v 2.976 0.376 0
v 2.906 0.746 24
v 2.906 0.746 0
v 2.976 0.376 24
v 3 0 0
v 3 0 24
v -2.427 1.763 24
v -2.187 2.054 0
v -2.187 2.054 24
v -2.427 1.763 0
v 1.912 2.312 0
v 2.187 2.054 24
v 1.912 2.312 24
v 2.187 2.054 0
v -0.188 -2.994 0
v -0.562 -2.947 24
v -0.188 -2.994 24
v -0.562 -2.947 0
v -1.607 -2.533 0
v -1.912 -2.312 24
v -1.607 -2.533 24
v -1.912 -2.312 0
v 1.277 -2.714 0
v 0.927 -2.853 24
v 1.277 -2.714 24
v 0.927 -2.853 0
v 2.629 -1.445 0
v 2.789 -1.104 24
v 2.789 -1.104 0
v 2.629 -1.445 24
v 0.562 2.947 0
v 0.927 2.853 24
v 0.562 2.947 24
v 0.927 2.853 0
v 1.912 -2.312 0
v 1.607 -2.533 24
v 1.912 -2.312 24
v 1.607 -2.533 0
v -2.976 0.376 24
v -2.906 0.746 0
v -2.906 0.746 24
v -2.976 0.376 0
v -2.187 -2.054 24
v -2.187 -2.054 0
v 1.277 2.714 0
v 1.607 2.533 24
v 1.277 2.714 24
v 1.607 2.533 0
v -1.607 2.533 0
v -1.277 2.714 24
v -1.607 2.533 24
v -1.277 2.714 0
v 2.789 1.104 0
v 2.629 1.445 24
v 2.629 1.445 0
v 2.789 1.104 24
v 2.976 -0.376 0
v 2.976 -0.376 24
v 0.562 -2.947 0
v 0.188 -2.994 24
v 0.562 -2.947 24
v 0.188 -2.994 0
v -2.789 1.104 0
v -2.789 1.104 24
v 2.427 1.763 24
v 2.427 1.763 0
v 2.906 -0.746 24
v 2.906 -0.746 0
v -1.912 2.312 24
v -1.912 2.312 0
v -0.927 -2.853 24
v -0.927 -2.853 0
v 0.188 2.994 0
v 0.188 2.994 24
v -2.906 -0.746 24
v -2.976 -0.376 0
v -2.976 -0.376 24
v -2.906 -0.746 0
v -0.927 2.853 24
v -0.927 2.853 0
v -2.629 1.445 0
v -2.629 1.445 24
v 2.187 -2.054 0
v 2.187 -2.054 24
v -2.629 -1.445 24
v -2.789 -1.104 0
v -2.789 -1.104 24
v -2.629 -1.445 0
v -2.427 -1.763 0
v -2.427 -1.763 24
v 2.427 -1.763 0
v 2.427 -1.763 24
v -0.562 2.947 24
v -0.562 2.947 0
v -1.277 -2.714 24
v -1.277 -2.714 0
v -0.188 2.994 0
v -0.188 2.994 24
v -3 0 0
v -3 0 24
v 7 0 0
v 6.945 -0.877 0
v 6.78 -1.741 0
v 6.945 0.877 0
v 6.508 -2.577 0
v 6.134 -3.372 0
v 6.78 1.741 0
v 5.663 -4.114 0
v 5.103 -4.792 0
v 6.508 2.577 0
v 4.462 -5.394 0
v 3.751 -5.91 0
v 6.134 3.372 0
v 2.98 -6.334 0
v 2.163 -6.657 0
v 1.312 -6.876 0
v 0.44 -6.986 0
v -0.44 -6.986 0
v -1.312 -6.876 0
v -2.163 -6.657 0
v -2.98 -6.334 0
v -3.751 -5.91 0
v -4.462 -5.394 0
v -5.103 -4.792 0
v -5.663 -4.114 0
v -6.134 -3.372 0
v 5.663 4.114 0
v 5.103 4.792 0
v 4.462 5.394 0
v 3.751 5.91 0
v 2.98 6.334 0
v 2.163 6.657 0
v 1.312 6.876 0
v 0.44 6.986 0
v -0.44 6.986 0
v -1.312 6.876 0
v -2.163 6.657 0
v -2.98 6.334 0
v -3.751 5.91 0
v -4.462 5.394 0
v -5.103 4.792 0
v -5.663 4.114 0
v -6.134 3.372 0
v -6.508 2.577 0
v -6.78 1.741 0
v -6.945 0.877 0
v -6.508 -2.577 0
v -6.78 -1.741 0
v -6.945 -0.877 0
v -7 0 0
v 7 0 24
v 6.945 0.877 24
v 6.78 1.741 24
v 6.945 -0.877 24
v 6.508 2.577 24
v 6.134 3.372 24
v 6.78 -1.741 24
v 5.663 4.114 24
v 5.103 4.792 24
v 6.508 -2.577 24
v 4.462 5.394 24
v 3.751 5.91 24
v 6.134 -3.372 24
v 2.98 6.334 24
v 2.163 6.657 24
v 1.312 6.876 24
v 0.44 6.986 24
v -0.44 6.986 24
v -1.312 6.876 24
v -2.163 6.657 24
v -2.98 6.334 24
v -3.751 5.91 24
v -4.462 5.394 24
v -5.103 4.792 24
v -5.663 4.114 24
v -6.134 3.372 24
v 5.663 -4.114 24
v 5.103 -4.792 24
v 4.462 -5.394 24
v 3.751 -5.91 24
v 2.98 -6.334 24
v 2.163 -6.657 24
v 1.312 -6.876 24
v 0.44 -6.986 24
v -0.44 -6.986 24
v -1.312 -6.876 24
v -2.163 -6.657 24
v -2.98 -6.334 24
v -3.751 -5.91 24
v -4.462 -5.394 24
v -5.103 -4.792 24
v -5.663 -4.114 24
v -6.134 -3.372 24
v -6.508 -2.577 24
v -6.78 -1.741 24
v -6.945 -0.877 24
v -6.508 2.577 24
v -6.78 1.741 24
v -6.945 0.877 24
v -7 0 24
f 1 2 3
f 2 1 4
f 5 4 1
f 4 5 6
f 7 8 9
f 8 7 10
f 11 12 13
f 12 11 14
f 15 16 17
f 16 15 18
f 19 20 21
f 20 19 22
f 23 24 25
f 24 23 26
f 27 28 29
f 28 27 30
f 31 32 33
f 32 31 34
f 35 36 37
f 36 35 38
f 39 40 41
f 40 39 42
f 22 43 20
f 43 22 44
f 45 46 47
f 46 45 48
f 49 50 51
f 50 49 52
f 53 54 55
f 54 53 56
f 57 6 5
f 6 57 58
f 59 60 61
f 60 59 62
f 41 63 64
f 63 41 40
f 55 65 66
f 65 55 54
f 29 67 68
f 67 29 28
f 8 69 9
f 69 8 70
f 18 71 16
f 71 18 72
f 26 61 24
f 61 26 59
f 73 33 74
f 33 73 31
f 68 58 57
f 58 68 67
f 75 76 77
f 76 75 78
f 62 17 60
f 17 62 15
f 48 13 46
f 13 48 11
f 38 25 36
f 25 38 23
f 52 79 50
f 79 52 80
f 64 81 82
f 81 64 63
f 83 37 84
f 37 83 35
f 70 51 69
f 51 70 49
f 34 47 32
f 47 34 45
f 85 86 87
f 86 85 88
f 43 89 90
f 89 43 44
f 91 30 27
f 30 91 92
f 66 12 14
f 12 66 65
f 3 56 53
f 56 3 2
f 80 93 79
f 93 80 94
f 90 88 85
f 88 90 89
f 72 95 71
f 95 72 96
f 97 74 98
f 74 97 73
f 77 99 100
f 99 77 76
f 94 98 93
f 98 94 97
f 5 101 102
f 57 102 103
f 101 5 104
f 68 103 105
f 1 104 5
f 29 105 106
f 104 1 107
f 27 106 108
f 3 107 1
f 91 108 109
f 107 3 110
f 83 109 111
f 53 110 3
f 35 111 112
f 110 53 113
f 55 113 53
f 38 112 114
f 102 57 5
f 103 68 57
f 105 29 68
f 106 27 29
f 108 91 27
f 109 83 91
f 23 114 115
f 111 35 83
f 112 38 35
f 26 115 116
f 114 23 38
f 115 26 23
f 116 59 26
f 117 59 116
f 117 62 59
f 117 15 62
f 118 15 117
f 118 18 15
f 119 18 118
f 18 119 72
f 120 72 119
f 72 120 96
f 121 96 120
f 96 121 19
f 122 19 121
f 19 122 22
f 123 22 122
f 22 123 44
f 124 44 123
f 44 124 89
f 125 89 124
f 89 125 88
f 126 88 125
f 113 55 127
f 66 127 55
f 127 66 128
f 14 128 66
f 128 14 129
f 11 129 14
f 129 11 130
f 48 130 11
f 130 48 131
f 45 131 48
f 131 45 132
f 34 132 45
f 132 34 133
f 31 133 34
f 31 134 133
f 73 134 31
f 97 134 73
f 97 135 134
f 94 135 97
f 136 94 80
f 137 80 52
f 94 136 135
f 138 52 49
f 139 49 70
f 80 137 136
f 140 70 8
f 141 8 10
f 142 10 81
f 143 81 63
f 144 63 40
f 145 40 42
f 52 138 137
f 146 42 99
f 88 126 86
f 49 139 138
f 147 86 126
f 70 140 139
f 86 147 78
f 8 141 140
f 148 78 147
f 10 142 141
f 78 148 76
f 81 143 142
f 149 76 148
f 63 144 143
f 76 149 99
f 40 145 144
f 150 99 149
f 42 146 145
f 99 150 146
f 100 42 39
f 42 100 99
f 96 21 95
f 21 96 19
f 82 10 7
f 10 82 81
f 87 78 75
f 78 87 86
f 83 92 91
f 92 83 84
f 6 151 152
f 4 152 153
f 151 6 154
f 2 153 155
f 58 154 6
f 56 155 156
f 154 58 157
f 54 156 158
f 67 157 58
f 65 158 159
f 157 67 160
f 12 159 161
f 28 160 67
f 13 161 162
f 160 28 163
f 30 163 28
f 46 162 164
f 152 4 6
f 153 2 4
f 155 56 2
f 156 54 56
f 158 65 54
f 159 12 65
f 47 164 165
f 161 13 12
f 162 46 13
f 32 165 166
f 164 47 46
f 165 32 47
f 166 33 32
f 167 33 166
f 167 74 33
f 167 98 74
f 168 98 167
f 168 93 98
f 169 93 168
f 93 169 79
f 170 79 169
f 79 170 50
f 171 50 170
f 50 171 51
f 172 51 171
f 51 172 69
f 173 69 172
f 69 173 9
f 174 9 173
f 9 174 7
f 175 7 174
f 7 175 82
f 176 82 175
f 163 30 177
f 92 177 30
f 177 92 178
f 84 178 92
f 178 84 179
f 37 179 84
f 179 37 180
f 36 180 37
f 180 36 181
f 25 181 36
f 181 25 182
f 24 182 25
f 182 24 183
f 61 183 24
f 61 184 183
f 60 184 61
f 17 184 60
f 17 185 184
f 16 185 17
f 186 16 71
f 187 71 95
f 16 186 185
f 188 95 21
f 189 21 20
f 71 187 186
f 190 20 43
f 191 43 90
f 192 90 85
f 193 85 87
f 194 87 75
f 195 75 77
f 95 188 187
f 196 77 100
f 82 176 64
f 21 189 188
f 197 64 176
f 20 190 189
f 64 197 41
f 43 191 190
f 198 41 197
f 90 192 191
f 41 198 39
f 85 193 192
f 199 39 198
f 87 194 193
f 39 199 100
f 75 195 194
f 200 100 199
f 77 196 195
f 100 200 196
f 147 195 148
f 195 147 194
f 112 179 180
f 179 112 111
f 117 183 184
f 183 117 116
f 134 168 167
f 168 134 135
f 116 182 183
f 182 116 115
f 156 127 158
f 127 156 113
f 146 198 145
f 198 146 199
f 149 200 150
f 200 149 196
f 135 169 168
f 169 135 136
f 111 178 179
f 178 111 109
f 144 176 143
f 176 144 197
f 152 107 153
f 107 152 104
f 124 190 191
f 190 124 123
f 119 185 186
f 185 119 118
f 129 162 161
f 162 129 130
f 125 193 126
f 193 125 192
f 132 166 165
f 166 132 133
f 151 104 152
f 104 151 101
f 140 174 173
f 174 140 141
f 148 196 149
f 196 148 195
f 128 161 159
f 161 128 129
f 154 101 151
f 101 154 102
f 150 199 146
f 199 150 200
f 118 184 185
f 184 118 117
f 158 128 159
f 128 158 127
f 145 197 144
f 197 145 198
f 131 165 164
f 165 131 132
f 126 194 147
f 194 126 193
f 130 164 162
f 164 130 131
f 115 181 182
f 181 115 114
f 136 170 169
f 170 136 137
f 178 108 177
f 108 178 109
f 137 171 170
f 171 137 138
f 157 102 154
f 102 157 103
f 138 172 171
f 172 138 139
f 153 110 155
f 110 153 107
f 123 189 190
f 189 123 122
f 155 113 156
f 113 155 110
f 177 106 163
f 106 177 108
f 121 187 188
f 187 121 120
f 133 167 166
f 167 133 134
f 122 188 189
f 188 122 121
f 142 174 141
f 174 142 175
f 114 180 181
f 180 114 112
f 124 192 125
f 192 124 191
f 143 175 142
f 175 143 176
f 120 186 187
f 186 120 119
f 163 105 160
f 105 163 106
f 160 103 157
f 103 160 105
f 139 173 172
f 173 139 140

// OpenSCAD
$fn = 50;

difference() {
	union() {
		cylinder(h = 24, r = 7.0);
	}
	union() {
		cylinder(h = 24, r = 3.0);
		cylinder(h = 24, r = 1.5);
	}
}
